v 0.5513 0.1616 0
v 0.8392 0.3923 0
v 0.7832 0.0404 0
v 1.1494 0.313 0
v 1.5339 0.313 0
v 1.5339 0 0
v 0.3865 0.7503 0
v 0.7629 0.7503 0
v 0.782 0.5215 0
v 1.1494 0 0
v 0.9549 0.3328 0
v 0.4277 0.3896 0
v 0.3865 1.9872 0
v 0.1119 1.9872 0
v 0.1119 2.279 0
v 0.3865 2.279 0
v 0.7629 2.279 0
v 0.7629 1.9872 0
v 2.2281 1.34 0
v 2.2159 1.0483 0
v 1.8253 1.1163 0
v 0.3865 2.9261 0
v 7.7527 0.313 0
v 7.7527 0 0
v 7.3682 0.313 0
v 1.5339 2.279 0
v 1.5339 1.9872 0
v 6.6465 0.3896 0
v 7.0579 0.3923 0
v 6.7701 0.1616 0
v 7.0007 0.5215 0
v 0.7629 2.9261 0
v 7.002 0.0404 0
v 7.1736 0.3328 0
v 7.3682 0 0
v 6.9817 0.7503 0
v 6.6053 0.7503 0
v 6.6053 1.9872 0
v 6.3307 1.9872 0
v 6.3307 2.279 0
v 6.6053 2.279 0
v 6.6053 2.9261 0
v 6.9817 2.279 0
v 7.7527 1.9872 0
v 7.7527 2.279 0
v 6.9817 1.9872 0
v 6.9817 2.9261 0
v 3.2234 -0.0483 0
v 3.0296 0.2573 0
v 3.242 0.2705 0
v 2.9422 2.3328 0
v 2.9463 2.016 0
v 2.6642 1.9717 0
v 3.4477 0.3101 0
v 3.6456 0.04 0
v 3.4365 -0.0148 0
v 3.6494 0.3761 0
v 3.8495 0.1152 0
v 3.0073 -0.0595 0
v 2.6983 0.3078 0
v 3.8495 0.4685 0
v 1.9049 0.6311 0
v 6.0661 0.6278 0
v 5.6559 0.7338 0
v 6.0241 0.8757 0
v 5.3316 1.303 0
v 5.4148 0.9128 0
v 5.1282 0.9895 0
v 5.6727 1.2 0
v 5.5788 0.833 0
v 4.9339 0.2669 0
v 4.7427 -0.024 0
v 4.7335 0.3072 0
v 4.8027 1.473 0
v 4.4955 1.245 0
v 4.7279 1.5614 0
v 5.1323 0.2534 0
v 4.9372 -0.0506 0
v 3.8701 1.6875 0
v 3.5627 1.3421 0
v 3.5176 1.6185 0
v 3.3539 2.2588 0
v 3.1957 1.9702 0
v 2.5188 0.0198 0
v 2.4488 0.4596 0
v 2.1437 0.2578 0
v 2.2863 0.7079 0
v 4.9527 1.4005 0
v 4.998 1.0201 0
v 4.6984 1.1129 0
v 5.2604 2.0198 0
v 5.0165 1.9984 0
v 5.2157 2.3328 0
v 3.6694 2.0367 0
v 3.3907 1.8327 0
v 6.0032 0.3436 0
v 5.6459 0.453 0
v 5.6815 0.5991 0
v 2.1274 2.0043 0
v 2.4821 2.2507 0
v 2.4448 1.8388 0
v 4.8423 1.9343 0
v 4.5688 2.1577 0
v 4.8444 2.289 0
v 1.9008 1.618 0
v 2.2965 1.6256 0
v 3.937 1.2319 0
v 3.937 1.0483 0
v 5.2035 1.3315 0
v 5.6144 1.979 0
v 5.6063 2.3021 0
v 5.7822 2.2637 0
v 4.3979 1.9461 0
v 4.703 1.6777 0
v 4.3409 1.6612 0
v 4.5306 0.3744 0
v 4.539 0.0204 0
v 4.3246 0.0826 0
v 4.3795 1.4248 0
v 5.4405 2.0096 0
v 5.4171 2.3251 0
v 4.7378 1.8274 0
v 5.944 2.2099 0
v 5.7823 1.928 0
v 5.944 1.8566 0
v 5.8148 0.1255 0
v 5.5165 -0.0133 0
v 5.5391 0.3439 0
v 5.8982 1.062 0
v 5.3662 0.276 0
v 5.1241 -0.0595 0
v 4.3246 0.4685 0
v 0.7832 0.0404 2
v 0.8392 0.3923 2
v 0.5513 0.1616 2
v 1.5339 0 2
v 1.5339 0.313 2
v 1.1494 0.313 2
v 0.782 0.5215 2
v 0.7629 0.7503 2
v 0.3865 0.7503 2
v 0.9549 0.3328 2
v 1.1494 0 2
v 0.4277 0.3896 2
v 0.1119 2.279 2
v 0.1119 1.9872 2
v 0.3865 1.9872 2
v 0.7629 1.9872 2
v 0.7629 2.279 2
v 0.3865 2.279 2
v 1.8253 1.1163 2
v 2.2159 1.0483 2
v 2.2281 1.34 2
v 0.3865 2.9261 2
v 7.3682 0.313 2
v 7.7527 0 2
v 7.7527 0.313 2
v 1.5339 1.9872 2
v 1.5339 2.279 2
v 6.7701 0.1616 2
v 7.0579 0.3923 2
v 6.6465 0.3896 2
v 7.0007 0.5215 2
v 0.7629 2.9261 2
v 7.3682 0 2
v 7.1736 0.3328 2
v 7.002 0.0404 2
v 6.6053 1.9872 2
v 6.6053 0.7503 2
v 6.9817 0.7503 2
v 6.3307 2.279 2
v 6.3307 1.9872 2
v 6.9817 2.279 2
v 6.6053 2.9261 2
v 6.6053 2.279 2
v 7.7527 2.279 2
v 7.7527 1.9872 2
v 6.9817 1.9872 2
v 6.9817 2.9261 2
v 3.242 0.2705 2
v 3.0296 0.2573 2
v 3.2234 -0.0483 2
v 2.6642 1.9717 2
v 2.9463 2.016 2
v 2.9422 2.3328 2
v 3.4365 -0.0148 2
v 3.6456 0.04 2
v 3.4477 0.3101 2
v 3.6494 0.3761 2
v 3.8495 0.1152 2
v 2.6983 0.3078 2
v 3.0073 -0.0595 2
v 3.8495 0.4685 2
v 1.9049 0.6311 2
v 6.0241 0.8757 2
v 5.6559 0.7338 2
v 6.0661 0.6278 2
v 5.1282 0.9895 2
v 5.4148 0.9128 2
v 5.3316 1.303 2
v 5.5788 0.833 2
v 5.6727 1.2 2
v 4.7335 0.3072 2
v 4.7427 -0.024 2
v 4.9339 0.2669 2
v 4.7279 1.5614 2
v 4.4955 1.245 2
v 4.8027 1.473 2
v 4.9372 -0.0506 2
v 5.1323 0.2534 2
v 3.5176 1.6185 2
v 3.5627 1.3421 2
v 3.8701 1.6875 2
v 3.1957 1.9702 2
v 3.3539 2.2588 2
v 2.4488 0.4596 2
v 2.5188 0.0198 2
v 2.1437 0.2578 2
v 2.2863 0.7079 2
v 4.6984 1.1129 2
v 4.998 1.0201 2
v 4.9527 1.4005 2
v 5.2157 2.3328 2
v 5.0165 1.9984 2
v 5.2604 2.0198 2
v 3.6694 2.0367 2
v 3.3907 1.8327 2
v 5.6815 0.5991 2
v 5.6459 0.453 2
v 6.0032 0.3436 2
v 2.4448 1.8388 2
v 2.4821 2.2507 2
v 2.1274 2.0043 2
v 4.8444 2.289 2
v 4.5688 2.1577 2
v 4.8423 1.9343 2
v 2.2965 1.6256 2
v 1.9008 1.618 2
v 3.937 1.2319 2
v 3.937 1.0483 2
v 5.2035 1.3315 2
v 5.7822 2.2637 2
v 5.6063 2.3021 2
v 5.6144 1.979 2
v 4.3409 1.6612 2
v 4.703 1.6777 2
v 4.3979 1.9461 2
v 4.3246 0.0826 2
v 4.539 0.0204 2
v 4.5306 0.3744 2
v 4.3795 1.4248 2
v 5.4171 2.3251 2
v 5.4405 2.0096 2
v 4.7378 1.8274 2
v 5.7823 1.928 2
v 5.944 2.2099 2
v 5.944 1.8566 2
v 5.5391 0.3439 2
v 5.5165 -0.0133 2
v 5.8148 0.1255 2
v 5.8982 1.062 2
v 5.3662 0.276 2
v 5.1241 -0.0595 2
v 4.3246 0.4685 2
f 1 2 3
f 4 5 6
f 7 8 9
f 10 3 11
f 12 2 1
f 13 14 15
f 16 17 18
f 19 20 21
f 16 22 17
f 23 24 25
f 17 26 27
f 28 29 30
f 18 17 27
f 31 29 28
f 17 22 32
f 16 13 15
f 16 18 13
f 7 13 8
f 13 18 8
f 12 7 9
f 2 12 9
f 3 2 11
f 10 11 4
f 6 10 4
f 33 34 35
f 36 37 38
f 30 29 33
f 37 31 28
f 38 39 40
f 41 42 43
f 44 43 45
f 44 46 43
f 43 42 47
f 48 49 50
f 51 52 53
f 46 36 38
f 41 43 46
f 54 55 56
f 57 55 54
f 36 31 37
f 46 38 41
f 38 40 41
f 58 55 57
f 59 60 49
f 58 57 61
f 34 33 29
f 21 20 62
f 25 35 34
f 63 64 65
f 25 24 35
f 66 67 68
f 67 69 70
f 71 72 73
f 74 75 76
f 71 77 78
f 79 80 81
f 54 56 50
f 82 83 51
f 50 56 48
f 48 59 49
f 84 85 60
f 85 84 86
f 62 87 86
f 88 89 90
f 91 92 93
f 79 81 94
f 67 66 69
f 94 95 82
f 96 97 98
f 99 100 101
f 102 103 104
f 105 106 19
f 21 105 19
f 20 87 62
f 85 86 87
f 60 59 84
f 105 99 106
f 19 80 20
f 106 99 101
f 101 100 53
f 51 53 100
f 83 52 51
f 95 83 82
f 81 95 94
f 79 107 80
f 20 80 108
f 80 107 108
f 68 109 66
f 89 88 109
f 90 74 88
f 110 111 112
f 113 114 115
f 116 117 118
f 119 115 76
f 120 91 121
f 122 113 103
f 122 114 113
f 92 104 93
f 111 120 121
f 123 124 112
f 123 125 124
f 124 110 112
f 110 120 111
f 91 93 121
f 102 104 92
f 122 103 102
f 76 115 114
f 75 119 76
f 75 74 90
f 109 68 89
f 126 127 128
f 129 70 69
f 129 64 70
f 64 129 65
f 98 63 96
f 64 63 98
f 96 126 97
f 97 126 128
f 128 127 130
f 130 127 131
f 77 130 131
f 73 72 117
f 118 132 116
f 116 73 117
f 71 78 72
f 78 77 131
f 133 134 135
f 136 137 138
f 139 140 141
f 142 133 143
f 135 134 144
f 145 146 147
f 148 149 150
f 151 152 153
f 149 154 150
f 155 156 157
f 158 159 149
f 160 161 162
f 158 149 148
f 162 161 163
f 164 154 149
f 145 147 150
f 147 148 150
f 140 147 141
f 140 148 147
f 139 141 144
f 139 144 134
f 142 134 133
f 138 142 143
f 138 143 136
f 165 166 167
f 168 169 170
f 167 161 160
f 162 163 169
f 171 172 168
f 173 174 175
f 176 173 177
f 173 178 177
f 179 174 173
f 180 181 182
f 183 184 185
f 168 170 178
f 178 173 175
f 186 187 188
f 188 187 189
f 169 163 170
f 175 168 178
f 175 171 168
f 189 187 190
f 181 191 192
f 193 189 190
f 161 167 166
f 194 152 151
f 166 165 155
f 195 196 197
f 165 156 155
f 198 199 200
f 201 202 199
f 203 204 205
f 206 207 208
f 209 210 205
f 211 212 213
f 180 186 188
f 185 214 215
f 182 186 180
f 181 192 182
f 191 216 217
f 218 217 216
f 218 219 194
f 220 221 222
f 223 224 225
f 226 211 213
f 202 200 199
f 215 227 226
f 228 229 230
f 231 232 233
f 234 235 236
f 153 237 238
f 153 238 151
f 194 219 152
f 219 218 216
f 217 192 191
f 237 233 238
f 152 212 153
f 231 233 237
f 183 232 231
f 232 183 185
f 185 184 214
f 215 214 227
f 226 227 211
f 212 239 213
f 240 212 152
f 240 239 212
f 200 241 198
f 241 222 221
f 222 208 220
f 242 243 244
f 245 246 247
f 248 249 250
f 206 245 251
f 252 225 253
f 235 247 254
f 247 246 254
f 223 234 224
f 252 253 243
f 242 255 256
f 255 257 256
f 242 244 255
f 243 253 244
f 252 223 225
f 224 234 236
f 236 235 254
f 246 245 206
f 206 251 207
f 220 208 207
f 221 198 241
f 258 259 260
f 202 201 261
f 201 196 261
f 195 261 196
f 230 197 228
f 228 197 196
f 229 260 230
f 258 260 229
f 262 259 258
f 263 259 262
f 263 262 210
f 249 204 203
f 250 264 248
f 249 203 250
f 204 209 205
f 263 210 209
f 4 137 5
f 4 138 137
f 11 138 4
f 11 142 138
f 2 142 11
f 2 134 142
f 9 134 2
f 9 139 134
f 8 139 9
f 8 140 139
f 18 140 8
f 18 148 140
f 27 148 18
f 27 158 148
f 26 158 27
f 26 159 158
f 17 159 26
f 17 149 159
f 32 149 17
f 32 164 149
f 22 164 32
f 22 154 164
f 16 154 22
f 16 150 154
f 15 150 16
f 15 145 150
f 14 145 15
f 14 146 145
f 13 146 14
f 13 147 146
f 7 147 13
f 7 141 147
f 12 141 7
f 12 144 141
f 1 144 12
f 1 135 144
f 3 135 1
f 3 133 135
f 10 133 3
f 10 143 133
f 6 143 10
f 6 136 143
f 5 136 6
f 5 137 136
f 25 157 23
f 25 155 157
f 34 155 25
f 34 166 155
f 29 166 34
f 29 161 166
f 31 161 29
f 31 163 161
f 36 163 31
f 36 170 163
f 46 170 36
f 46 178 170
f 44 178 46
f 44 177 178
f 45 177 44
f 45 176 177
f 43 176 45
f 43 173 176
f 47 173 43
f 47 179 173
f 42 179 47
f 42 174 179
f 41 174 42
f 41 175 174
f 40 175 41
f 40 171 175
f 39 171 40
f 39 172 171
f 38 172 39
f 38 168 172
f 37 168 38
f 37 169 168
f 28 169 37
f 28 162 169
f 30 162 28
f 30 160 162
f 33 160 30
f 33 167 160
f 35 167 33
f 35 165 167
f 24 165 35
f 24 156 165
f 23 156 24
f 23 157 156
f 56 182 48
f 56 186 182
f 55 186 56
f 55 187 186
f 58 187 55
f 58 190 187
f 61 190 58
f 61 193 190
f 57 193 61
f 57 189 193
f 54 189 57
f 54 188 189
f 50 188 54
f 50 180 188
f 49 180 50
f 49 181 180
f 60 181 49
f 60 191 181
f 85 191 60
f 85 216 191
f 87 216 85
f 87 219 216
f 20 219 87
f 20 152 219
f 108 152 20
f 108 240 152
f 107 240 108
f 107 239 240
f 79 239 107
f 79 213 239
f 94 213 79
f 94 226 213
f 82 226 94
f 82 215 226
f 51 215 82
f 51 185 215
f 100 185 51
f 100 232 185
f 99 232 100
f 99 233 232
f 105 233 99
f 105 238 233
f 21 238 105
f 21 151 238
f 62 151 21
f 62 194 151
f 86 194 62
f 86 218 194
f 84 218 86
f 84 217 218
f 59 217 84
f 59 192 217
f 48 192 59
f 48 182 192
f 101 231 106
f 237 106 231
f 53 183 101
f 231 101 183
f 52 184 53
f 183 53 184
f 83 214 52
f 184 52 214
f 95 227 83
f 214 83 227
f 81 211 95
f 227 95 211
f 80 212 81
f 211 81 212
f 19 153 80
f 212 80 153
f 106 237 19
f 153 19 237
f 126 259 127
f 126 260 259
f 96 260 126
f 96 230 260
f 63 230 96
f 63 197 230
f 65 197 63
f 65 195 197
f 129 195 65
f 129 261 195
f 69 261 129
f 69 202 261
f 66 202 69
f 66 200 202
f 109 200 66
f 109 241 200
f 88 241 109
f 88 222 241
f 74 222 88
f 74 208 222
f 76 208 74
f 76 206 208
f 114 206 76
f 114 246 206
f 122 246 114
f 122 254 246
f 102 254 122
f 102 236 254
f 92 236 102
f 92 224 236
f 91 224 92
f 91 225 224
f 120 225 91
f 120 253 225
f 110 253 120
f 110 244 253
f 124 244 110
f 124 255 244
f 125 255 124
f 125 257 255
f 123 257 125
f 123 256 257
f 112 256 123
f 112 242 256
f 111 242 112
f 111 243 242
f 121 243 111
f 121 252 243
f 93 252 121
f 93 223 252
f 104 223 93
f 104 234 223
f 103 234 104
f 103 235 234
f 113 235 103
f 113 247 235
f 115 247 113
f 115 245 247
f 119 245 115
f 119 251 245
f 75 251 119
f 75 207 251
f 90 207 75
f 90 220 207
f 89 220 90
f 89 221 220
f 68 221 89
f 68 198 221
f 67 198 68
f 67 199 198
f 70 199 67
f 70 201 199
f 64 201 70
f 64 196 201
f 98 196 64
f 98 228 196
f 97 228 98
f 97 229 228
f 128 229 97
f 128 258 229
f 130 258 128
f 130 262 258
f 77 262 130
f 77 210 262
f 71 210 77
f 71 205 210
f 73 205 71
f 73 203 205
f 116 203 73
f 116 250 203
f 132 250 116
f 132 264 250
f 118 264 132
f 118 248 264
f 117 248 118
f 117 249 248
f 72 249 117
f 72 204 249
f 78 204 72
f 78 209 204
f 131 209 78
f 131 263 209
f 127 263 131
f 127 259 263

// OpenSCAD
texte_a_inserer = "test"; 
taille = 3; 
police = "Metrophobic"; //[[Abril Fatface,Aclonica,Acme,Advent Pro,Akronim,Aladin,Alegreya,Alegreya Sans,Alegreya SC,Alex Brush,Alfa Slab One,Alice,Amaranth,Architects Daughter,Archivo Black,Archivo Narrow,Arimo,Arvo,Asap,Astloch,Asul,Averia Libre,Averia Serif Libre,Bangers,Basic,Belgrano,Berkshire Swash,Bigshot One,Bilbo Swash Caps,Black Ops One,Bonbon,Bowlby One SC,Brawler,Bubblegum Sans,Butterfly Kids,Cabin Condensed,Caesar Dressing,Cagliostro,Calligraffitti,Capriola,Carter One,Changa One,Chango,Chelsea Market,Cherry Cream Soda,Chewy,Chicle,Chivo,Clicker Script,Coming Soon,Concert One,Condiment,Cookie,Courgette,Covered By Your Grace,Crimson Text,Dancing Script,DejaVu Sans,DejaVu Serif,Dhurjati,Doppio One,Dosis,Droid Sans,Eagle Lake,Electrolize,Emilys Candy,Encode Sans,Encode Sans Compressed,Euphoria Script,Exo,Exo 2,Faster One,Federo,Finger Paint,Fjord One,Fontdiner Swanky,Freckle Face,Fruktur,Gabriela,Geo,Germania One,Give You Glory,Gloria Hallelujah,Goudy Bookletter 1911,Graduate,Grand Hotel,Great Vibes,Griffy,Hanalei Fill,Happy Monkey,Henny Penny,Hind,IM Fell English SC,Indie Flower,Irish Grover,Italianno,Jacques Francois Shadow,Jolly Lodger,Josefin Slab,Joti One,Judson,Just Another Hand,Kalam,Kameron,Karma,Kavoon,Knewave,Kranky,Kristi,Laila,Lakki Reddy,Lancelot,Lato,Leckerli One,Ledger,Lekton,Lemon One,Liberation Sans,Libre Caslon Text,Life Savers,Lilita One,Lily Script One,Limelight,Lobster,Lobster Two,Londrina Outline,Londrina Shadow,Londrina Solid,Lora,Love Ya Like A Sister,Loved by the King,Lovers Quarrel,Luckiest Guy,Lusitana,Macondo,Macondo Swash Caps,Mako,Marck Script,Margarine,Marko One,Maven Pro,McLaren,MedievalSharp,Merienda One,Merriweather,Mervale Script,Metal Mania,Metrophobic,Milonga,Miltonian Tattoo,Miss Fajardose,Molle,Montez,Montserrat,Mr De Haviland,Mystery Quest,Neucha,New Rocker,Niconne,Nosifer,Nothing You Could Do,Noto Sans Oriya,Noto Serif,Nova Square,Nunito,Old Standard TT,Oleo Script,Oleo Script Swash Caps,Orbitron,Oregano,Orienta,Original Surfer,Oswald,Over the Rainbow,Overlock,Oxygen,Pacifico,Paprika,Parisienne,Patrick Hand SC,Paytone One,Peralta,Permanent Marker,Piedra,Pirata One,Play,Playball,Poetsen One,Poppins,Press Start 2P,Princess Sofia,PT Mono,Qwigley,Racing Sans One,Raleway,Rancho,Ranga,Ribeye,Roboto,Roboto Condensed,Roboto Slab,Rochester,Rock Salt,Rubik One,Sail,Salsa,Sansita One,Sarina,Satisfy,Schoolbell,Seaweed Script,Sevillana,Shadows Into Light,Shadows Into Light Two,Share,Six Caps,Skranji,Source Sans Pro,Spicy Rice,Stardos Stencil,Stoke,Syncopate,Teko,Terminal Dosis,The Girl Next Door,Tillana,Timmana,Titillium Web,Ubuntu,Ultra,Underdog,UnifrakturCook,UnifrakturMaguntia,Vampiro One,Vidaloka,Viga,Voces,Volkhov,Vollkorn,Voltaire,Waiting for the Sunrise,Wallpoet,Wellfleet,Wendy One,Yellowtail,Yesteryear,Zeyada]]
hauteur = 2; 
module rendu(){
linear_extrude(hauteur) text(texte_a_inserer,size = taille, font = police);
}
rendu();
 
